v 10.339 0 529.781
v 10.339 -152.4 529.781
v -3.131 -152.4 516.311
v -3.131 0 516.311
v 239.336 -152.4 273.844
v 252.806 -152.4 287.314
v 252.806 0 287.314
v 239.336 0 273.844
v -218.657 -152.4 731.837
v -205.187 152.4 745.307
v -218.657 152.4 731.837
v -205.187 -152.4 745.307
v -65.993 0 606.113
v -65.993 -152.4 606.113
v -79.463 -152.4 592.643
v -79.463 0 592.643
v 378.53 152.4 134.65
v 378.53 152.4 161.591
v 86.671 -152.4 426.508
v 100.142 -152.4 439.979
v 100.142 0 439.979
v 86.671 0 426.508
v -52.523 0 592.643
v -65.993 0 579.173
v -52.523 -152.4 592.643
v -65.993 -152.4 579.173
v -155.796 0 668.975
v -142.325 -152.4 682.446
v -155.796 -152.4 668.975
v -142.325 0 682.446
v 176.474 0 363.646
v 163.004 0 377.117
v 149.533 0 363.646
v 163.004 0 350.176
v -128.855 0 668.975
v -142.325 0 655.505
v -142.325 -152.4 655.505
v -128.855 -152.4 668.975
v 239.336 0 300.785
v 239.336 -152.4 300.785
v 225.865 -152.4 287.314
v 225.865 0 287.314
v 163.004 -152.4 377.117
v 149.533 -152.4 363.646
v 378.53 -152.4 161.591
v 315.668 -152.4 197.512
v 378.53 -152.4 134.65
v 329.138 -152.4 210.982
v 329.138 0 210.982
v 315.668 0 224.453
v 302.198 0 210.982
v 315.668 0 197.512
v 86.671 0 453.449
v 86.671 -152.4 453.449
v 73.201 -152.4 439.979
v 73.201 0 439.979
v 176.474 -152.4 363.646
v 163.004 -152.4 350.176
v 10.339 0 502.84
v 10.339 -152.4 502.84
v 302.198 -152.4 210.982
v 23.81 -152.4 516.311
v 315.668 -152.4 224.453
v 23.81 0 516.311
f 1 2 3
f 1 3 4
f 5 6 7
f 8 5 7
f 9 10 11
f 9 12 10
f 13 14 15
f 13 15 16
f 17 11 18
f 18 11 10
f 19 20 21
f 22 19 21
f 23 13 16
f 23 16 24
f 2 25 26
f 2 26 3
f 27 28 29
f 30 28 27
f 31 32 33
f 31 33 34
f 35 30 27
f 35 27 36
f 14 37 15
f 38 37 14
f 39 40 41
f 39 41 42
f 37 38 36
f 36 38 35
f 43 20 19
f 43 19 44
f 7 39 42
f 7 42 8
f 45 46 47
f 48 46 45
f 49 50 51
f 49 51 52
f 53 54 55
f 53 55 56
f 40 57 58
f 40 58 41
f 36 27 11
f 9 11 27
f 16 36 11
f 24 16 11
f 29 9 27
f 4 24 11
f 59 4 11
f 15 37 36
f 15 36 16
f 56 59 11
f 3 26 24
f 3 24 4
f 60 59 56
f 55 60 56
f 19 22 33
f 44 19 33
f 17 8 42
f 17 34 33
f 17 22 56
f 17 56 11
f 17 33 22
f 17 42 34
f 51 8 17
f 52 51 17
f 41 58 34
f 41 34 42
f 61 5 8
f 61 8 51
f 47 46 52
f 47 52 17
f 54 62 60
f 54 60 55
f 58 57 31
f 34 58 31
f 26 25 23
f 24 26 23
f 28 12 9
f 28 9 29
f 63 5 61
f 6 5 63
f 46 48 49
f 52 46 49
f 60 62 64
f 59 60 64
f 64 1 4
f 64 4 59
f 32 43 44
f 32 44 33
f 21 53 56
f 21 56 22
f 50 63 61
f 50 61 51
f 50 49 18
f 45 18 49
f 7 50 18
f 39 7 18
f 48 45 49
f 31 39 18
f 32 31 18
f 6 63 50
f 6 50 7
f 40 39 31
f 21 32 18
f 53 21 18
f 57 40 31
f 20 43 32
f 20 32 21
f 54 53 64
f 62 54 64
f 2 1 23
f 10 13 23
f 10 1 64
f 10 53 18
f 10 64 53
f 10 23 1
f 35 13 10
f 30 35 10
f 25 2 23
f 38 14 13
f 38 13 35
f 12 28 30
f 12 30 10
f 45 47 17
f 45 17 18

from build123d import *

# Parameters (mm, degrees)
F1_DEPTH = 152.4
F2_W     = 19.05
F2_H     = 152.4
F3_DEPTH = 19.05


with BuildPart() as f1:
    # F0 (on Front) → F1 (new body, symmetric)
    with BuildSketch(Plane.XZ):
        Polygon((-218.657332487, 731.8369923304), (378.5296995641, 134.6499602793), (378.5296995641, 161.5907286425), (-205.1869483054, 745.307376512), align=None)
    extrude(amount=F1_DEPTH, both=True)

    # F2 (on face) → F3 (cut)
    with BuildSketch(Plane(origin=(270.0602141033, 0, 270.0602141033), x_dir=(0.7071067812, 0, -0.7071067812), z_dir=(0.7071067812, 0, 0.7071067812))):
        with Locations((74.0240174423, -76.2)):
            Rectangle(F2_W, F2_H)
        with Locations((-33.9259825577, -76.2)):
            Rectangle(F2_W, F2_H)
        with Locations((-141.8759825577, -76.2)):
            Rectangle(F2_W, F2_H)
        with Locations((-249.8259825577, -76.2)):
            Rectangle(F2_W, F2_H)
        with Locations((-357.7759825577, -76.2)):
            Rectangle(F2_W, F2_H)
        with Locations((-465.7259825577, -76.2)):
            Rectangle(F2_W, F2_H)
        with Locations((-573.6759825577, -76.2)):
            Rectangle(F2_W, F2_H)
    extrude(amount=-F3_DEPTH, mode=Mode.SUBTRACT)


solid = f1.part
